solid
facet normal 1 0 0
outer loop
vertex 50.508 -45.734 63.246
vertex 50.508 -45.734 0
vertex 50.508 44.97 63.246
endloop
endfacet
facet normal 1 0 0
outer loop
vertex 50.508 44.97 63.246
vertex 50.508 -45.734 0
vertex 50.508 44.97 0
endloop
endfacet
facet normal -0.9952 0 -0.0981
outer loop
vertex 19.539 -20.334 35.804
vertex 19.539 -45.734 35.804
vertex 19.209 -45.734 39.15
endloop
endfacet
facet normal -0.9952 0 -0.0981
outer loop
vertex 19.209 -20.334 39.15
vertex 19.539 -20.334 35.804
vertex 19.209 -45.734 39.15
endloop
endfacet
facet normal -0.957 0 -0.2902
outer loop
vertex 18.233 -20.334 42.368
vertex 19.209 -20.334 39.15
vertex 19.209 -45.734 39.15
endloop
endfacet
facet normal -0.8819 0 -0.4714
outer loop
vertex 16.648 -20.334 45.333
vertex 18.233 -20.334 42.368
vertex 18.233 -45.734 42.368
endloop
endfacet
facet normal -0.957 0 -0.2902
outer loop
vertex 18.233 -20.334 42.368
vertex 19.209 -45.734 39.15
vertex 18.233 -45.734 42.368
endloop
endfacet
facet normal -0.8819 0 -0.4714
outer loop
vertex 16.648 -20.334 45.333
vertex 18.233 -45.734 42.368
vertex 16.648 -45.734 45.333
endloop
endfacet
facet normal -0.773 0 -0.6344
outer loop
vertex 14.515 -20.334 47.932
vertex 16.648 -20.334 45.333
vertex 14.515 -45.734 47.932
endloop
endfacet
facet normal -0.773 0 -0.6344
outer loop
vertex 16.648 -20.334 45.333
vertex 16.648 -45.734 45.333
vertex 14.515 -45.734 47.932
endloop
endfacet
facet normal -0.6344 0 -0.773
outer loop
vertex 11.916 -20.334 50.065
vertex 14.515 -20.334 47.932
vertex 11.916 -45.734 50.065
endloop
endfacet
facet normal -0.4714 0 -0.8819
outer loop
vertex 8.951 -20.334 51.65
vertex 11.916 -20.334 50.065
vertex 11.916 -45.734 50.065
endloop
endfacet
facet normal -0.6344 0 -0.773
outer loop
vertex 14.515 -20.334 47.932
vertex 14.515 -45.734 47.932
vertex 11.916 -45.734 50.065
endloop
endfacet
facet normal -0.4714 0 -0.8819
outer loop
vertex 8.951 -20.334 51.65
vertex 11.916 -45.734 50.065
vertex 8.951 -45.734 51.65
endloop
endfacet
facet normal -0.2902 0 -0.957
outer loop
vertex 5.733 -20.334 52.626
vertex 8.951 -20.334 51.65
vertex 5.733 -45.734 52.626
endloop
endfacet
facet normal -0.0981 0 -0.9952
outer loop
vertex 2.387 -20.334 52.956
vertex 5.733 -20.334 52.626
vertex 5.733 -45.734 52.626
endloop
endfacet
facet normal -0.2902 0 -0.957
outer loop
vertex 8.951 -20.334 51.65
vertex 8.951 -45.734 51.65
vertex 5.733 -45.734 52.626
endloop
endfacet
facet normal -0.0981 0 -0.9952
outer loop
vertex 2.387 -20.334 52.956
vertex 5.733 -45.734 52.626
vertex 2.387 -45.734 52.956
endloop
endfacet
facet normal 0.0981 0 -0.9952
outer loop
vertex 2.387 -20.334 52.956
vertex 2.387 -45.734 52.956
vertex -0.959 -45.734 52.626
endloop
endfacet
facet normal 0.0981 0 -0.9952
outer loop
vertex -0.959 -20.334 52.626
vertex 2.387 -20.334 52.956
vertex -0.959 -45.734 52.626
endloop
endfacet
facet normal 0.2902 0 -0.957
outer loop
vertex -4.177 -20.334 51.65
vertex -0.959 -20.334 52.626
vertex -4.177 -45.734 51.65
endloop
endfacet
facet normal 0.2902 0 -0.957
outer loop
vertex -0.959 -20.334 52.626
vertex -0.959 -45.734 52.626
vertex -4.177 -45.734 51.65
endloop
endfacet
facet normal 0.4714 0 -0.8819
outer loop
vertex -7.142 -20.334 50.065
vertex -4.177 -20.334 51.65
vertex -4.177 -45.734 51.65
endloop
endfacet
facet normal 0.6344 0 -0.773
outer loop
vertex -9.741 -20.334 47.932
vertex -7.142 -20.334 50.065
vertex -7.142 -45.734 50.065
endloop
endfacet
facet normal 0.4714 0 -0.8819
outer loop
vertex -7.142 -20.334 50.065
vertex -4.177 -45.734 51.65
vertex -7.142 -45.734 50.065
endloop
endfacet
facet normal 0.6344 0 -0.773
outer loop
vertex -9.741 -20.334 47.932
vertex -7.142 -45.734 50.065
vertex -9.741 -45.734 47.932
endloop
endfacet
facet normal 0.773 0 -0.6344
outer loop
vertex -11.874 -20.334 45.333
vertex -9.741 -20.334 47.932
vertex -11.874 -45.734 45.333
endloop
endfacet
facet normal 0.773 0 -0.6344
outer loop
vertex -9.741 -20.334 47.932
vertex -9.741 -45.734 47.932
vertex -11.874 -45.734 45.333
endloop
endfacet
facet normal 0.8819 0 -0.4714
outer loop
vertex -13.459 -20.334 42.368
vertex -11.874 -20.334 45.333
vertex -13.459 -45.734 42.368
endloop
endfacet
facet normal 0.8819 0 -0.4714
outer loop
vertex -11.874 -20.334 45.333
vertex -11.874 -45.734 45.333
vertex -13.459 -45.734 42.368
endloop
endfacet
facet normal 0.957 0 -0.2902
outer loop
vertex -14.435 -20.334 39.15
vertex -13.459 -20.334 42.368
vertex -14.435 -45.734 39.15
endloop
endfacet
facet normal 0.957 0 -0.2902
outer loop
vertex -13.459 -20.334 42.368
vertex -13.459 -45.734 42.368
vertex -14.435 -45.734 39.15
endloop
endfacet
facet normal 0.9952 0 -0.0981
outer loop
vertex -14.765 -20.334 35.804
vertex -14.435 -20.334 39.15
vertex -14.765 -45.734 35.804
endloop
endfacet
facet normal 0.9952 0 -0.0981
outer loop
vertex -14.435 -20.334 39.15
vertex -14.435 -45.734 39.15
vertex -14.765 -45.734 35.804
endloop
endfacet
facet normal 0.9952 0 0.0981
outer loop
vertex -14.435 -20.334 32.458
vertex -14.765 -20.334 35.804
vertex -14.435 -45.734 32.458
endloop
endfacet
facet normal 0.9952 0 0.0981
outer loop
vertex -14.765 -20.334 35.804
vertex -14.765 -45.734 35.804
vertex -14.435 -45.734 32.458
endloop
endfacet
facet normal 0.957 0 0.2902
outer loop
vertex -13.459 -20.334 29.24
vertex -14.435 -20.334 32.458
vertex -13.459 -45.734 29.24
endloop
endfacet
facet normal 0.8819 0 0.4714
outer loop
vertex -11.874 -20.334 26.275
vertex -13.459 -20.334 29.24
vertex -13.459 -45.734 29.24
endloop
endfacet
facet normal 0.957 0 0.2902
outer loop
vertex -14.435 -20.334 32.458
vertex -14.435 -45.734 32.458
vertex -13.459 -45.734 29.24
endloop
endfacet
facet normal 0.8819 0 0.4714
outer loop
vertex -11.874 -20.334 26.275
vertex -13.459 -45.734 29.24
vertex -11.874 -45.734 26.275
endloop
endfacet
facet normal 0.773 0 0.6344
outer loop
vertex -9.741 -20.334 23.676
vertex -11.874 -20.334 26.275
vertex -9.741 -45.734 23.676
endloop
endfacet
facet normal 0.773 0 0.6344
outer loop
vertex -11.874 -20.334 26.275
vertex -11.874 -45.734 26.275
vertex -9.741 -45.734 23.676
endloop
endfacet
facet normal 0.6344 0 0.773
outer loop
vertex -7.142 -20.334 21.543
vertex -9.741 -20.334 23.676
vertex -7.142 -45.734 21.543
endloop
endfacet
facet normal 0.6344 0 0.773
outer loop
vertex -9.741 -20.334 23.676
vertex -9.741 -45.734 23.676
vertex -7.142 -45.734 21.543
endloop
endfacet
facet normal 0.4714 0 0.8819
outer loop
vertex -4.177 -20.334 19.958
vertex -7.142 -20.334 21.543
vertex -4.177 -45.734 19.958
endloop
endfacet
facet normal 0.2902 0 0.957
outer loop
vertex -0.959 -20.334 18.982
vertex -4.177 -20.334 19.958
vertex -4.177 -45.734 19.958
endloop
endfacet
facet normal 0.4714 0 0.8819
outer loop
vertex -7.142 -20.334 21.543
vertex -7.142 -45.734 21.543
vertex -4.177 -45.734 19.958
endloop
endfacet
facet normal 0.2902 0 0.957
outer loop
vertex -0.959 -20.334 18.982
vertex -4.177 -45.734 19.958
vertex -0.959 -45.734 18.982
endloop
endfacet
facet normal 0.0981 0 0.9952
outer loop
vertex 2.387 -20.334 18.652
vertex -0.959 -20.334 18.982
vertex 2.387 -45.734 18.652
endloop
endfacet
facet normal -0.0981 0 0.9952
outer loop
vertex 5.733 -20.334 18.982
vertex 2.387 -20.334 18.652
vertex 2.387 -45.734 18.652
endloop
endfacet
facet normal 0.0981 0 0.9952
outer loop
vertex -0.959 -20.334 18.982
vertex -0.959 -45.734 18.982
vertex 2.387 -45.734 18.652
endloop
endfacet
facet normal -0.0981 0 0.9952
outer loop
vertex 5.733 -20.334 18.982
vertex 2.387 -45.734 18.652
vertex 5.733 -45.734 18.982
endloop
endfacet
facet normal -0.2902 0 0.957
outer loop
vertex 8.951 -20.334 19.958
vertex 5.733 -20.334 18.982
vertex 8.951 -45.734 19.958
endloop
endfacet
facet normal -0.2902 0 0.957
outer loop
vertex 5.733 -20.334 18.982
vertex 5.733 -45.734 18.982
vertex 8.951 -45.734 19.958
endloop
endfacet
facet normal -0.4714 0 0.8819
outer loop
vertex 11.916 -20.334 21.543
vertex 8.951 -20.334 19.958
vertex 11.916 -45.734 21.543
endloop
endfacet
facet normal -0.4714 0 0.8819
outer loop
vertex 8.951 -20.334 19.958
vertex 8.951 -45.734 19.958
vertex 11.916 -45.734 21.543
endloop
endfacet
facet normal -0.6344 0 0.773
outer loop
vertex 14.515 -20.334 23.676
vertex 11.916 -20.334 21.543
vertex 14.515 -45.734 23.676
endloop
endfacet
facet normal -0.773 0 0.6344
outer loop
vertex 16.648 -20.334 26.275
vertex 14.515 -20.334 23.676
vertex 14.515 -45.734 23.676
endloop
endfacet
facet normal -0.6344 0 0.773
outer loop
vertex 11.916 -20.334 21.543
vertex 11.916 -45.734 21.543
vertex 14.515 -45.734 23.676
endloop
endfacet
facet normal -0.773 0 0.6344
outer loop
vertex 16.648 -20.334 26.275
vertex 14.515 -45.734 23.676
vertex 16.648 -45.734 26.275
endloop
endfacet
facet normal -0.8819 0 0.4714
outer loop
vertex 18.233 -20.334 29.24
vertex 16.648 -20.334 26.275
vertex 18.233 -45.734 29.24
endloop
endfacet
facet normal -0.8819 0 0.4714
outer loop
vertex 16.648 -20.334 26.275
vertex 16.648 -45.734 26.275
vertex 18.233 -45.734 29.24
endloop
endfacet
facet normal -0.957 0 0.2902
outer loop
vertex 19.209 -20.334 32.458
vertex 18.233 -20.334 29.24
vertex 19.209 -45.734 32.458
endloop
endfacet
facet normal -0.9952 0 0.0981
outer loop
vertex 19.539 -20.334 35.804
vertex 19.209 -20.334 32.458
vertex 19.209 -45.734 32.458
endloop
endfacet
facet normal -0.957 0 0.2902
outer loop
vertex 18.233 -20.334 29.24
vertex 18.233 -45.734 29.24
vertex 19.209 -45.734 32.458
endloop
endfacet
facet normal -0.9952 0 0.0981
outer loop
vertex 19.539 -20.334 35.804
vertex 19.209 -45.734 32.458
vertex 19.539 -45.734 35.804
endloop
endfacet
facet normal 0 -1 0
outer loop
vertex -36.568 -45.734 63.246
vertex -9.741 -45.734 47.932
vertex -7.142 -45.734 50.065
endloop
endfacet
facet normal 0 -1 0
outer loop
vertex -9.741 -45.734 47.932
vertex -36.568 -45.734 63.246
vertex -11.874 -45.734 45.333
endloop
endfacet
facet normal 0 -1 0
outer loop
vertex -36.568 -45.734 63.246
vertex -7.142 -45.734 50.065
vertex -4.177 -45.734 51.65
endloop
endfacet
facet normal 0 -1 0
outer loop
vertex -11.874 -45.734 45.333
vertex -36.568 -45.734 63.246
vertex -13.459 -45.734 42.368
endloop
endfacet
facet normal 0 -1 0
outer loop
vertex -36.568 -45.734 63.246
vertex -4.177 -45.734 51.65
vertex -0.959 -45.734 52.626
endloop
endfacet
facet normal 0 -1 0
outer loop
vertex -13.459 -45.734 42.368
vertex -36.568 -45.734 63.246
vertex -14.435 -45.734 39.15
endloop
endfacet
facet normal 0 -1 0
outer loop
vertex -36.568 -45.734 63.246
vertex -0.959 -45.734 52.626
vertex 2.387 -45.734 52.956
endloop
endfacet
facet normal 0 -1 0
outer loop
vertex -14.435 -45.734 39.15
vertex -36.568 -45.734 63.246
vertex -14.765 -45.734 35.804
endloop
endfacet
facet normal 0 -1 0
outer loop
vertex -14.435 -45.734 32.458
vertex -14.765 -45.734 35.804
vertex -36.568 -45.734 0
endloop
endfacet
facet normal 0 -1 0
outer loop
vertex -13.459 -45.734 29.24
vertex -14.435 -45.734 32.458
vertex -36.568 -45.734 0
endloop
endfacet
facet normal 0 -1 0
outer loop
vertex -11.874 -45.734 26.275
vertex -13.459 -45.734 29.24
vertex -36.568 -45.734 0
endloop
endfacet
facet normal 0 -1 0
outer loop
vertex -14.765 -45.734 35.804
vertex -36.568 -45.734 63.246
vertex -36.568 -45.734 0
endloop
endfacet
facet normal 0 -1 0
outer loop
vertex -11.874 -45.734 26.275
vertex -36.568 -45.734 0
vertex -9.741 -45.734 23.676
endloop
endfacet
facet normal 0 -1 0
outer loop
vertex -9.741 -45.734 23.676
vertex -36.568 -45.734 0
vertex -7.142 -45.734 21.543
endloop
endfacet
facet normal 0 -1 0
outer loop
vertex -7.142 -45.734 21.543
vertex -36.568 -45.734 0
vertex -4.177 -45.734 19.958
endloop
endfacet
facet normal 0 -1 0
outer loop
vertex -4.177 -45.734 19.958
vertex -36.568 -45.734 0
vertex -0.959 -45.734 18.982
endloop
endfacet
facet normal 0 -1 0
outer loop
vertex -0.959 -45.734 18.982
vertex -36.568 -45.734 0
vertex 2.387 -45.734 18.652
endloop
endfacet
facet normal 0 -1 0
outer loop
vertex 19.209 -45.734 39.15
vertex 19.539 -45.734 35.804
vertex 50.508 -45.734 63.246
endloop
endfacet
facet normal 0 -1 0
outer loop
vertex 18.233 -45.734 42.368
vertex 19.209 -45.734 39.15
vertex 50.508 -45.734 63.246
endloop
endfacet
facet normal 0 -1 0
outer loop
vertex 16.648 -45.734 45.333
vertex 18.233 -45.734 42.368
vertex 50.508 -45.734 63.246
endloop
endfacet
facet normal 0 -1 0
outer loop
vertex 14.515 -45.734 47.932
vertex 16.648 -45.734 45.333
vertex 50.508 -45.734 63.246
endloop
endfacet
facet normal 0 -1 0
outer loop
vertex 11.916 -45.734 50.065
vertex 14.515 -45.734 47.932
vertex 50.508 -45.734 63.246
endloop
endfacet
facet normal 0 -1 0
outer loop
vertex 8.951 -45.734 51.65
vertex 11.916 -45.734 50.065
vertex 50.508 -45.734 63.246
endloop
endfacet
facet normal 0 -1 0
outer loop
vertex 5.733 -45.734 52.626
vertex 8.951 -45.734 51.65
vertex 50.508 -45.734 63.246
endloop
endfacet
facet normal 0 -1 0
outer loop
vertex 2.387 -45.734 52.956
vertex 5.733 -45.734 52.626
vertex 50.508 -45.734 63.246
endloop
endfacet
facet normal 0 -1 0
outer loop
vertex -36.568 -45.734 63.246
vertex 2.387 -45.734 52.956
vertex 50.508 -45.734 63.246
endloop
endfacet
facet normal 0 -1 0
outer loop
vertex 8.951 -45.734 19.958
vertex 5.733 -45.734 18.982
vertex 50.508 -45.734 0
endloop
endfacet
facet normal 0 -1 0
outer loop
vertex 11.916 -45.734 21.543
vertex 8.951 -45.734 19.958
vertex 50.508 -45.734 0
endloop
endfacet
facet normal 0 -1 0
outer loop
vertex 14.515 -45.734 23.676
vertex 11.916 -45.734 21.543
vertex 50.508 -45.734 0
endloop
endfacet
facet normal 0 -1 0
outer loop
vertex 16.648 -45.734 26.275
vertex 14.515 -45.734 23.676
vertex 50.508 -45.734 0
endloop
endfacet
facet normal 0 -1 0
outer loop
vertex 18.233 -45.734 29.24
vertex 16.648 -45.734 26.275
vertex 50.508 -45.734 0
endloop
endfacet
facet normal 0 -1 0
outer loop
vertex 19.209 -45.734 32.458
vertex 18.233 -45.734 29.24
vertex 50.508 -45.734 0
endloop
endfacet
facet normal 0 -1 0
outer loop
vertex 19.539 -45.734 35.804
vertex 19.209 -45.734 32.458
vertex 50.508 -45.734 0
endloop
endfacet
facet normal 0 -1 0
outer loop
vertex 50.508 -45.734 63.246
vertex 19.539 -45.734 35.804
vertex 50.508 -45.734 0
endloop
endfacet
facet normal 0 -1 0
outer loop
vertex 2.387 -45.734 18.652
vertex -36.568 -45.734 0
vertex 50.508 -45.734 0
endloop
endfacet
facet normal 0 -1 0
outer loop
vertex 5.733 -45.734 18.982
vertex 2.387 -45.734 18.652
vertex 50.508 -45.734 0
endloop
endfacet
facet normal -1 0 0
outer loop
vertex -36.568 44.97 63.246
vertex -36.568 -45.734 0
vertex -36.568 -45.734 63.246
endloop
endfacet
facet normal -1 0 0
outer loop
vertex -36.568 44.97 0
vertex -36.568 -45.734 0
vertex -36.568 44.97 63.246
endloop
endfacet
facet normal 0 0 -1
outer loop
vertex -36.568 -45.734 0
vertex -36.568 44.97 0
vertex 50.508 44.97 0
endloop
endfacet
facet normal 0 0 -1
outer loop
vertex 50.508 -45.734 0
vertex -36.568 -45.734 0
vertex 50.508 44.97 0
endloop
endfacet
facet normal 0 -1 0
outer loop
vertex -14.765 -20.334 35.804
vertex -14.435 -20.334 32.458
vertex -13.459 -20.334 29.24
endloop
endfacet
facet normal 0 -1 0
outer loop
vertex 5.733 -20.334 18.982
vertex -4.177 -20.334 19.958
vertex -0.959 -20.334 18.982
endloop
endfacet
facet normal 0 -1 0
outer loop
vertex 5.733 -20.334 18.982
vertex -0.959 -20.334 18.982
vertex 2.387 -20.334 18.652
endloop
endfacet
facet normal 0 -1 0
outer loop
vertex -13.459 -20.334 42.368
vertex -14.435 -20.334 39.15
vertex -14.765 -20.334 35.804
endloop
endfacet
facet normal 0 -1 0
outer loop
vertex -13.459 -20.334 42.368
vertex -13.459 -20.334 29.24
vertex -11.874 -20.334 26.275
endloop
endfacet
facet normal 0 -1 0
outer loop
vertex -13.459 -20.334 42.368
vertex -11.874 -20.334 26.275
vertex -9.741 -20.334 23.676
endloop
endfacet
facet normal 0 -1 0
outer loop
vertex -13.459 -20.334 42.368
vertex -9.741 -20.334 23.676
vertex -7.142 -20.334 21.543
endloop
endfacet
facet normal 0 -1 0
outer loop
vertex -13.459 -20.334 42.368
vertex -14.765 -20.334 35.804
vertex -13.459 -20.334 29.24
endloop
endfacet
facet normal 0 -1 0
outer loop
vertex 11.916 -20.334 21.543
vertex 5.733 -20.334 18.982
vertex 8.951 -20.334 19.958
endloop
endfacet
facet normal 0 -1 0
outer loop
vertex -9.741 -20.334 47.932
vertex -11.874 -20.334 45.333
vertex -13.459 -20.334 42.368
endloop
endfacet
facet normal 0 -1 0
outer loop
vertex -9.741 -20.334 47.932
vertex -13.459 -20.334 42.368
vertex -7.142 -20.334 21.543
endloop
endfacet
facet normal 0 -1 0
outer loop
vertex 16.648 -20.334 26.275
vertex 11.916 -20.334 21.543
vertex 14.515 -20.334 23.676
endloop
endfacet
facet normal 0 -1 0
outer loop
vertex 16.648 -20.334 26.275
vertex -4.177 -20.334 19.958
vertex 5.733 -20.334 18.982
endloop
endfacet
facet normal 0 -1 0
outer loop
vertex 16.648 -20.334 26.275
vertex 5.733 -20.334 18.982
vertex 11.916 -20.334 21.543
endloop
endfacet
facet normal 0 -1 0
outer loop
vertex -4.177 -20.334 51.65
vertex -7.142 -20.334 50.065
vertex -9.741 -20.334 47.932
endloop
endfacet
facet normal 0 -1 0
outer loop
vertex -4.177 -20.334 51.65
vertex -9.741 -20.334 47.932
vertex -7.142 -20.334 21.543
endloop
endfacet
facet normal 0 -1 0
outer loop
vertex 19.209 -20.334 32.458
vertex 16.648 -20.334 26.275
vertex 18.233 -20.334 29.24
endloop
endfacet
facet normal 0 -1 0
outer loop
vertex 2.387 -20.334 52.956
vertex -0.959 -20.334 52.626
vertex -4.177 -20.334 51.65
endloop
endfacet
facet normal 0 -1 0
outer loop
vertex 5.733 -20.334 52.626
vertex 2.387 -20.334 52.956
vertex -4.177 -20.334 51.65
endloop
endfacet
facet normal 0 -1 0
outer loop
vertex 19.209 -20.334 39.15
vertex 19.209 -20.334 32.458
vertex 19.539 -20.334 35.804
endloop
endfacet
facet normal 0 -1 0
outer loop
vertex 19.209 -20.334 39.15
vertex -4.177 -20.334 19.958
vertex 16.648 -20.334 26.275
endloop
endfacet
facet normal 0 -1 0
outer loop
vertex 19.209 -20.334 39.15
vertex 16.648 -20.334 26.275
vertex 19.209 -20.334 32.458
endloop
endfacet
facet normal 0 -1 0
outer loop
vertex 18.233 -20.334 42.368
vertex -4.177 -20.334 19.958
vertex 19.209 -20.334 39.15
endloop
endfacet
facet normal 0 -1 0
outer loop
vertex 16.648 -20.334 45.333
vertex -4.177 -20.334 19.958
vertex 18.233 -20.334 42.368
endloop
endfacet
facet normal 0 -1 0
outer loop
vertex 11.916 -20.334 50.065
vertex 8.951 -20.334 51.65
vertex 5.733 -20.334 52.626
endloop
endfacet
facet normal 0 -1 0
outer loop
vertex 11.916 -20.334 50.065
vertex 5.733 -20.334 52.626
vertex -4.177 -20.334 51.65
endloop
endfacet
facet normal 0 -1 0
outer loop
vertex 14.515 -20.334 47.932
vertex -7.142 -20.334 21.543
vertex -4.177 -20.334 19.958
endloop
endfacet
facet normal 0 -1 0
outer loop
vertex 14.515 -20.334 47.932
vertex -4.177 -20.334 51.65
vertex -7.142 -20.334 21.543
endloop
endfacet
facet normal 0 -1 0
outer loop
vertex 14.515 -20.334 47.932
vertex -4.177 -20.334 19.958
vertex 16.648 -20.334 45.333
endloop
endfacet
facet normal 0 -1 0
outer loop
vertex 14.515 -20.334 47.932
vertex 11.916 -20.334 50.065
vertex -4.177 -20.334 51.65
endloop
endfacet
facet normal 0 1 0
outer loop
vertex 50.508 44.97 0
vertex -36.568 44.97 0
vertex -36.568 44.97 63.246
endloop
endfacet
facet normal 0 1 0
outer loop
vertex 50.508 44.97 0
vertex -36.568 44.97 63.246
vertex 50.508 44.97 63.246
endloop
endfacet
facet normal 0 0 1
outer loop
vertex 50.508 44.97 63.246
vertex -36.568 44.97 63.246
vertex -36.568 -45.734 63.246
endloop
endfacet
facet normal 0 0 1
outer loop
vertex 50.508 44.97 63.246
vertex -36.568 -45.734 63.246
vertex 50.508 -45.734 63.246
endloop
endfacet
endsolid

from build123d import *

# Parameters (mm, degrees)
F0_W     = 87.075323
F0_H     = 90.703461
F1_DEPTH = 63.246
F2_R     = 10.983628
F3_DEPTH = 25.4
F4_R     = 17.151938
F5_DEPTH = 25.4


with BuildPart() as f1:
    # F0 (on Top) → F1 (new body)
    with BuildSketch(Plane.XY):
        with Locations((6.969846, -0.381911)):
            Rectangle(F0_W, F0_H)
    extrude(amount=F1_DEPTH)

    # F2 (on Top) → F3 (cut)
    with BuildSketch(Plane.XY):
        Circle(F2_R)
    extrude(amount=-F3_DEPTH, mode=Mode.SUBTRACT)

    # F4 (on face) → F5 (cut)
    with BuildSketch(Plane.XZ.offset(45.733642)):
        with Locations((2.386932, 35.803996)):
            Circle(F4_R)
    extrude(amount=-F5_DEPTH, mode=Mode.SUBTRACT)


solid = f1.part
